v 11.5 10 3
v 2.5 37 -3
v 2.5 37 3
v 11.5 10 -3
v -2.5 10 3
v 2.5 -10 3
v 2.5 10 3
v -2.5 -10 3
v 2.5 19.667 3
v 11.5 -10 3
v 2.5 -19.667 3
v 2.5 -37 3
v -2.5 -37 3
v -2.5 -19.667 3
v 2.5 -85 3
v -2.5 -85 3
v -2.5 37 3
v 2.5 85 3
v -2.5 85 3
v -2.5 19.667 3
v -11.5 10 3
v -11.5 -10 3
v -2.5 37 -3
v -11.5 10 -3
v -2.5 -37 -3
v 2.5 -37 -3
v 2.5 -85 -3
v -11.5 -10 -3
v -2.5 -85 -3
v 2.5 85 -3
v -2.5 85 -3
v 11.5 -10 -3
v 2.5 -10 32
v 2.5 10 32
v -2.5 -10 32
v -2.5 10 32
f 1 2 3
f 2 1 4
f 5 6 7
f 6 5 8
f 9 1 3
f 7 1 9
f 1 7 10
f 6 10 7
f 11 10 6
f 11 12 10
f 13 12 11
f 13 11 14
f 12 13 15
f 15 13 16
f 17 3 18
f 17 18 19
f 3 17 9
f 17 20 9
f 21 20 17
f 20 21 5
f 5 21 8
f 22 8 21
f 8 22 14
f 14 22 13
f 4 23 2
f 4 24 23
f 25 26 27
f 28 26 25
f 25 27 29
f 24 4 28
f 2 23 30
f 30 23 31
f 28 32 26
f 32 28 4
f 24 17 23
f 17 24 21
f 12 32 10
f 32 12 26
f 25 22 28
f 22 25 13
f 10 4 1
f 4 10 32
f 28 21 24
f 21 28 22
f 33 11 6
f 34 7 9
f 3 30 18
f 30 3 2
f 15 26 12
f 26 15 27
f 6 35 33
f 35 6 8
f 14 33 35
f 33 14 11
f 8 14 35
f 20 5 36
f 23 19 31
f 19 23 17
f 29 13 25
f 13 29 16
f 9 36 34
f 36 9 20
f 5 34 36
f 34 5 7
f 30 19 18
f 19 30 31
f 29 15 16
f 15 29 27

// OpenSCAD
stone_width = 20;
support_length = stone_width + 150;

//the width, actually
side_length = 5;
side_height = 30;
side_width = 10;

base_height=6;
base_width=stone_width;
base_length=23;

base_support_size=30;

union() {
  // base
  cube([base_length,base_width,base_height], true);
  // side supports for stone
  translate([-side_length/2, -(stone_width/2 + side_width), base_height/2-1]) prism(side_length, side_width, side_height);
  translate([side_length/2, stone_width/2 + side_width, base_height/2-1]) rotate([0,0,180]) prism(side_length, side_width, side_height);
  // base extrusion for stability
  cube([side_length, support_length, base_height], true);

  // base triangles to support extrusion
   for (x = [0,180]) { 
     rotate ([x,0,0]) union() {
       translate([side_length/2-1,base_support_size+stone_width/2-0,-base_height/2]) rotate([180,270,0]) prism(base_height, base_support_size, side_width);
       translate([-side_length/2+1,base_support_size+stone_width/2,base_height/2]) rotate([180,90,0]) prism(base_height, base_support_size, side_width);
     }
   }  
}

module prism(l, w, h){
      polyhedron(//pt 0        1        2        3        4        5
              points=[[0,0,0], [l,0,0], [l,w,0], [0,w,0], [0,w,h], [l,w,h]],
              faces=[[0,1,2,3],[5,4,3,2],[0,4,5,1],[0,3,4],[5,2,1]]
              );
      
      }
  
